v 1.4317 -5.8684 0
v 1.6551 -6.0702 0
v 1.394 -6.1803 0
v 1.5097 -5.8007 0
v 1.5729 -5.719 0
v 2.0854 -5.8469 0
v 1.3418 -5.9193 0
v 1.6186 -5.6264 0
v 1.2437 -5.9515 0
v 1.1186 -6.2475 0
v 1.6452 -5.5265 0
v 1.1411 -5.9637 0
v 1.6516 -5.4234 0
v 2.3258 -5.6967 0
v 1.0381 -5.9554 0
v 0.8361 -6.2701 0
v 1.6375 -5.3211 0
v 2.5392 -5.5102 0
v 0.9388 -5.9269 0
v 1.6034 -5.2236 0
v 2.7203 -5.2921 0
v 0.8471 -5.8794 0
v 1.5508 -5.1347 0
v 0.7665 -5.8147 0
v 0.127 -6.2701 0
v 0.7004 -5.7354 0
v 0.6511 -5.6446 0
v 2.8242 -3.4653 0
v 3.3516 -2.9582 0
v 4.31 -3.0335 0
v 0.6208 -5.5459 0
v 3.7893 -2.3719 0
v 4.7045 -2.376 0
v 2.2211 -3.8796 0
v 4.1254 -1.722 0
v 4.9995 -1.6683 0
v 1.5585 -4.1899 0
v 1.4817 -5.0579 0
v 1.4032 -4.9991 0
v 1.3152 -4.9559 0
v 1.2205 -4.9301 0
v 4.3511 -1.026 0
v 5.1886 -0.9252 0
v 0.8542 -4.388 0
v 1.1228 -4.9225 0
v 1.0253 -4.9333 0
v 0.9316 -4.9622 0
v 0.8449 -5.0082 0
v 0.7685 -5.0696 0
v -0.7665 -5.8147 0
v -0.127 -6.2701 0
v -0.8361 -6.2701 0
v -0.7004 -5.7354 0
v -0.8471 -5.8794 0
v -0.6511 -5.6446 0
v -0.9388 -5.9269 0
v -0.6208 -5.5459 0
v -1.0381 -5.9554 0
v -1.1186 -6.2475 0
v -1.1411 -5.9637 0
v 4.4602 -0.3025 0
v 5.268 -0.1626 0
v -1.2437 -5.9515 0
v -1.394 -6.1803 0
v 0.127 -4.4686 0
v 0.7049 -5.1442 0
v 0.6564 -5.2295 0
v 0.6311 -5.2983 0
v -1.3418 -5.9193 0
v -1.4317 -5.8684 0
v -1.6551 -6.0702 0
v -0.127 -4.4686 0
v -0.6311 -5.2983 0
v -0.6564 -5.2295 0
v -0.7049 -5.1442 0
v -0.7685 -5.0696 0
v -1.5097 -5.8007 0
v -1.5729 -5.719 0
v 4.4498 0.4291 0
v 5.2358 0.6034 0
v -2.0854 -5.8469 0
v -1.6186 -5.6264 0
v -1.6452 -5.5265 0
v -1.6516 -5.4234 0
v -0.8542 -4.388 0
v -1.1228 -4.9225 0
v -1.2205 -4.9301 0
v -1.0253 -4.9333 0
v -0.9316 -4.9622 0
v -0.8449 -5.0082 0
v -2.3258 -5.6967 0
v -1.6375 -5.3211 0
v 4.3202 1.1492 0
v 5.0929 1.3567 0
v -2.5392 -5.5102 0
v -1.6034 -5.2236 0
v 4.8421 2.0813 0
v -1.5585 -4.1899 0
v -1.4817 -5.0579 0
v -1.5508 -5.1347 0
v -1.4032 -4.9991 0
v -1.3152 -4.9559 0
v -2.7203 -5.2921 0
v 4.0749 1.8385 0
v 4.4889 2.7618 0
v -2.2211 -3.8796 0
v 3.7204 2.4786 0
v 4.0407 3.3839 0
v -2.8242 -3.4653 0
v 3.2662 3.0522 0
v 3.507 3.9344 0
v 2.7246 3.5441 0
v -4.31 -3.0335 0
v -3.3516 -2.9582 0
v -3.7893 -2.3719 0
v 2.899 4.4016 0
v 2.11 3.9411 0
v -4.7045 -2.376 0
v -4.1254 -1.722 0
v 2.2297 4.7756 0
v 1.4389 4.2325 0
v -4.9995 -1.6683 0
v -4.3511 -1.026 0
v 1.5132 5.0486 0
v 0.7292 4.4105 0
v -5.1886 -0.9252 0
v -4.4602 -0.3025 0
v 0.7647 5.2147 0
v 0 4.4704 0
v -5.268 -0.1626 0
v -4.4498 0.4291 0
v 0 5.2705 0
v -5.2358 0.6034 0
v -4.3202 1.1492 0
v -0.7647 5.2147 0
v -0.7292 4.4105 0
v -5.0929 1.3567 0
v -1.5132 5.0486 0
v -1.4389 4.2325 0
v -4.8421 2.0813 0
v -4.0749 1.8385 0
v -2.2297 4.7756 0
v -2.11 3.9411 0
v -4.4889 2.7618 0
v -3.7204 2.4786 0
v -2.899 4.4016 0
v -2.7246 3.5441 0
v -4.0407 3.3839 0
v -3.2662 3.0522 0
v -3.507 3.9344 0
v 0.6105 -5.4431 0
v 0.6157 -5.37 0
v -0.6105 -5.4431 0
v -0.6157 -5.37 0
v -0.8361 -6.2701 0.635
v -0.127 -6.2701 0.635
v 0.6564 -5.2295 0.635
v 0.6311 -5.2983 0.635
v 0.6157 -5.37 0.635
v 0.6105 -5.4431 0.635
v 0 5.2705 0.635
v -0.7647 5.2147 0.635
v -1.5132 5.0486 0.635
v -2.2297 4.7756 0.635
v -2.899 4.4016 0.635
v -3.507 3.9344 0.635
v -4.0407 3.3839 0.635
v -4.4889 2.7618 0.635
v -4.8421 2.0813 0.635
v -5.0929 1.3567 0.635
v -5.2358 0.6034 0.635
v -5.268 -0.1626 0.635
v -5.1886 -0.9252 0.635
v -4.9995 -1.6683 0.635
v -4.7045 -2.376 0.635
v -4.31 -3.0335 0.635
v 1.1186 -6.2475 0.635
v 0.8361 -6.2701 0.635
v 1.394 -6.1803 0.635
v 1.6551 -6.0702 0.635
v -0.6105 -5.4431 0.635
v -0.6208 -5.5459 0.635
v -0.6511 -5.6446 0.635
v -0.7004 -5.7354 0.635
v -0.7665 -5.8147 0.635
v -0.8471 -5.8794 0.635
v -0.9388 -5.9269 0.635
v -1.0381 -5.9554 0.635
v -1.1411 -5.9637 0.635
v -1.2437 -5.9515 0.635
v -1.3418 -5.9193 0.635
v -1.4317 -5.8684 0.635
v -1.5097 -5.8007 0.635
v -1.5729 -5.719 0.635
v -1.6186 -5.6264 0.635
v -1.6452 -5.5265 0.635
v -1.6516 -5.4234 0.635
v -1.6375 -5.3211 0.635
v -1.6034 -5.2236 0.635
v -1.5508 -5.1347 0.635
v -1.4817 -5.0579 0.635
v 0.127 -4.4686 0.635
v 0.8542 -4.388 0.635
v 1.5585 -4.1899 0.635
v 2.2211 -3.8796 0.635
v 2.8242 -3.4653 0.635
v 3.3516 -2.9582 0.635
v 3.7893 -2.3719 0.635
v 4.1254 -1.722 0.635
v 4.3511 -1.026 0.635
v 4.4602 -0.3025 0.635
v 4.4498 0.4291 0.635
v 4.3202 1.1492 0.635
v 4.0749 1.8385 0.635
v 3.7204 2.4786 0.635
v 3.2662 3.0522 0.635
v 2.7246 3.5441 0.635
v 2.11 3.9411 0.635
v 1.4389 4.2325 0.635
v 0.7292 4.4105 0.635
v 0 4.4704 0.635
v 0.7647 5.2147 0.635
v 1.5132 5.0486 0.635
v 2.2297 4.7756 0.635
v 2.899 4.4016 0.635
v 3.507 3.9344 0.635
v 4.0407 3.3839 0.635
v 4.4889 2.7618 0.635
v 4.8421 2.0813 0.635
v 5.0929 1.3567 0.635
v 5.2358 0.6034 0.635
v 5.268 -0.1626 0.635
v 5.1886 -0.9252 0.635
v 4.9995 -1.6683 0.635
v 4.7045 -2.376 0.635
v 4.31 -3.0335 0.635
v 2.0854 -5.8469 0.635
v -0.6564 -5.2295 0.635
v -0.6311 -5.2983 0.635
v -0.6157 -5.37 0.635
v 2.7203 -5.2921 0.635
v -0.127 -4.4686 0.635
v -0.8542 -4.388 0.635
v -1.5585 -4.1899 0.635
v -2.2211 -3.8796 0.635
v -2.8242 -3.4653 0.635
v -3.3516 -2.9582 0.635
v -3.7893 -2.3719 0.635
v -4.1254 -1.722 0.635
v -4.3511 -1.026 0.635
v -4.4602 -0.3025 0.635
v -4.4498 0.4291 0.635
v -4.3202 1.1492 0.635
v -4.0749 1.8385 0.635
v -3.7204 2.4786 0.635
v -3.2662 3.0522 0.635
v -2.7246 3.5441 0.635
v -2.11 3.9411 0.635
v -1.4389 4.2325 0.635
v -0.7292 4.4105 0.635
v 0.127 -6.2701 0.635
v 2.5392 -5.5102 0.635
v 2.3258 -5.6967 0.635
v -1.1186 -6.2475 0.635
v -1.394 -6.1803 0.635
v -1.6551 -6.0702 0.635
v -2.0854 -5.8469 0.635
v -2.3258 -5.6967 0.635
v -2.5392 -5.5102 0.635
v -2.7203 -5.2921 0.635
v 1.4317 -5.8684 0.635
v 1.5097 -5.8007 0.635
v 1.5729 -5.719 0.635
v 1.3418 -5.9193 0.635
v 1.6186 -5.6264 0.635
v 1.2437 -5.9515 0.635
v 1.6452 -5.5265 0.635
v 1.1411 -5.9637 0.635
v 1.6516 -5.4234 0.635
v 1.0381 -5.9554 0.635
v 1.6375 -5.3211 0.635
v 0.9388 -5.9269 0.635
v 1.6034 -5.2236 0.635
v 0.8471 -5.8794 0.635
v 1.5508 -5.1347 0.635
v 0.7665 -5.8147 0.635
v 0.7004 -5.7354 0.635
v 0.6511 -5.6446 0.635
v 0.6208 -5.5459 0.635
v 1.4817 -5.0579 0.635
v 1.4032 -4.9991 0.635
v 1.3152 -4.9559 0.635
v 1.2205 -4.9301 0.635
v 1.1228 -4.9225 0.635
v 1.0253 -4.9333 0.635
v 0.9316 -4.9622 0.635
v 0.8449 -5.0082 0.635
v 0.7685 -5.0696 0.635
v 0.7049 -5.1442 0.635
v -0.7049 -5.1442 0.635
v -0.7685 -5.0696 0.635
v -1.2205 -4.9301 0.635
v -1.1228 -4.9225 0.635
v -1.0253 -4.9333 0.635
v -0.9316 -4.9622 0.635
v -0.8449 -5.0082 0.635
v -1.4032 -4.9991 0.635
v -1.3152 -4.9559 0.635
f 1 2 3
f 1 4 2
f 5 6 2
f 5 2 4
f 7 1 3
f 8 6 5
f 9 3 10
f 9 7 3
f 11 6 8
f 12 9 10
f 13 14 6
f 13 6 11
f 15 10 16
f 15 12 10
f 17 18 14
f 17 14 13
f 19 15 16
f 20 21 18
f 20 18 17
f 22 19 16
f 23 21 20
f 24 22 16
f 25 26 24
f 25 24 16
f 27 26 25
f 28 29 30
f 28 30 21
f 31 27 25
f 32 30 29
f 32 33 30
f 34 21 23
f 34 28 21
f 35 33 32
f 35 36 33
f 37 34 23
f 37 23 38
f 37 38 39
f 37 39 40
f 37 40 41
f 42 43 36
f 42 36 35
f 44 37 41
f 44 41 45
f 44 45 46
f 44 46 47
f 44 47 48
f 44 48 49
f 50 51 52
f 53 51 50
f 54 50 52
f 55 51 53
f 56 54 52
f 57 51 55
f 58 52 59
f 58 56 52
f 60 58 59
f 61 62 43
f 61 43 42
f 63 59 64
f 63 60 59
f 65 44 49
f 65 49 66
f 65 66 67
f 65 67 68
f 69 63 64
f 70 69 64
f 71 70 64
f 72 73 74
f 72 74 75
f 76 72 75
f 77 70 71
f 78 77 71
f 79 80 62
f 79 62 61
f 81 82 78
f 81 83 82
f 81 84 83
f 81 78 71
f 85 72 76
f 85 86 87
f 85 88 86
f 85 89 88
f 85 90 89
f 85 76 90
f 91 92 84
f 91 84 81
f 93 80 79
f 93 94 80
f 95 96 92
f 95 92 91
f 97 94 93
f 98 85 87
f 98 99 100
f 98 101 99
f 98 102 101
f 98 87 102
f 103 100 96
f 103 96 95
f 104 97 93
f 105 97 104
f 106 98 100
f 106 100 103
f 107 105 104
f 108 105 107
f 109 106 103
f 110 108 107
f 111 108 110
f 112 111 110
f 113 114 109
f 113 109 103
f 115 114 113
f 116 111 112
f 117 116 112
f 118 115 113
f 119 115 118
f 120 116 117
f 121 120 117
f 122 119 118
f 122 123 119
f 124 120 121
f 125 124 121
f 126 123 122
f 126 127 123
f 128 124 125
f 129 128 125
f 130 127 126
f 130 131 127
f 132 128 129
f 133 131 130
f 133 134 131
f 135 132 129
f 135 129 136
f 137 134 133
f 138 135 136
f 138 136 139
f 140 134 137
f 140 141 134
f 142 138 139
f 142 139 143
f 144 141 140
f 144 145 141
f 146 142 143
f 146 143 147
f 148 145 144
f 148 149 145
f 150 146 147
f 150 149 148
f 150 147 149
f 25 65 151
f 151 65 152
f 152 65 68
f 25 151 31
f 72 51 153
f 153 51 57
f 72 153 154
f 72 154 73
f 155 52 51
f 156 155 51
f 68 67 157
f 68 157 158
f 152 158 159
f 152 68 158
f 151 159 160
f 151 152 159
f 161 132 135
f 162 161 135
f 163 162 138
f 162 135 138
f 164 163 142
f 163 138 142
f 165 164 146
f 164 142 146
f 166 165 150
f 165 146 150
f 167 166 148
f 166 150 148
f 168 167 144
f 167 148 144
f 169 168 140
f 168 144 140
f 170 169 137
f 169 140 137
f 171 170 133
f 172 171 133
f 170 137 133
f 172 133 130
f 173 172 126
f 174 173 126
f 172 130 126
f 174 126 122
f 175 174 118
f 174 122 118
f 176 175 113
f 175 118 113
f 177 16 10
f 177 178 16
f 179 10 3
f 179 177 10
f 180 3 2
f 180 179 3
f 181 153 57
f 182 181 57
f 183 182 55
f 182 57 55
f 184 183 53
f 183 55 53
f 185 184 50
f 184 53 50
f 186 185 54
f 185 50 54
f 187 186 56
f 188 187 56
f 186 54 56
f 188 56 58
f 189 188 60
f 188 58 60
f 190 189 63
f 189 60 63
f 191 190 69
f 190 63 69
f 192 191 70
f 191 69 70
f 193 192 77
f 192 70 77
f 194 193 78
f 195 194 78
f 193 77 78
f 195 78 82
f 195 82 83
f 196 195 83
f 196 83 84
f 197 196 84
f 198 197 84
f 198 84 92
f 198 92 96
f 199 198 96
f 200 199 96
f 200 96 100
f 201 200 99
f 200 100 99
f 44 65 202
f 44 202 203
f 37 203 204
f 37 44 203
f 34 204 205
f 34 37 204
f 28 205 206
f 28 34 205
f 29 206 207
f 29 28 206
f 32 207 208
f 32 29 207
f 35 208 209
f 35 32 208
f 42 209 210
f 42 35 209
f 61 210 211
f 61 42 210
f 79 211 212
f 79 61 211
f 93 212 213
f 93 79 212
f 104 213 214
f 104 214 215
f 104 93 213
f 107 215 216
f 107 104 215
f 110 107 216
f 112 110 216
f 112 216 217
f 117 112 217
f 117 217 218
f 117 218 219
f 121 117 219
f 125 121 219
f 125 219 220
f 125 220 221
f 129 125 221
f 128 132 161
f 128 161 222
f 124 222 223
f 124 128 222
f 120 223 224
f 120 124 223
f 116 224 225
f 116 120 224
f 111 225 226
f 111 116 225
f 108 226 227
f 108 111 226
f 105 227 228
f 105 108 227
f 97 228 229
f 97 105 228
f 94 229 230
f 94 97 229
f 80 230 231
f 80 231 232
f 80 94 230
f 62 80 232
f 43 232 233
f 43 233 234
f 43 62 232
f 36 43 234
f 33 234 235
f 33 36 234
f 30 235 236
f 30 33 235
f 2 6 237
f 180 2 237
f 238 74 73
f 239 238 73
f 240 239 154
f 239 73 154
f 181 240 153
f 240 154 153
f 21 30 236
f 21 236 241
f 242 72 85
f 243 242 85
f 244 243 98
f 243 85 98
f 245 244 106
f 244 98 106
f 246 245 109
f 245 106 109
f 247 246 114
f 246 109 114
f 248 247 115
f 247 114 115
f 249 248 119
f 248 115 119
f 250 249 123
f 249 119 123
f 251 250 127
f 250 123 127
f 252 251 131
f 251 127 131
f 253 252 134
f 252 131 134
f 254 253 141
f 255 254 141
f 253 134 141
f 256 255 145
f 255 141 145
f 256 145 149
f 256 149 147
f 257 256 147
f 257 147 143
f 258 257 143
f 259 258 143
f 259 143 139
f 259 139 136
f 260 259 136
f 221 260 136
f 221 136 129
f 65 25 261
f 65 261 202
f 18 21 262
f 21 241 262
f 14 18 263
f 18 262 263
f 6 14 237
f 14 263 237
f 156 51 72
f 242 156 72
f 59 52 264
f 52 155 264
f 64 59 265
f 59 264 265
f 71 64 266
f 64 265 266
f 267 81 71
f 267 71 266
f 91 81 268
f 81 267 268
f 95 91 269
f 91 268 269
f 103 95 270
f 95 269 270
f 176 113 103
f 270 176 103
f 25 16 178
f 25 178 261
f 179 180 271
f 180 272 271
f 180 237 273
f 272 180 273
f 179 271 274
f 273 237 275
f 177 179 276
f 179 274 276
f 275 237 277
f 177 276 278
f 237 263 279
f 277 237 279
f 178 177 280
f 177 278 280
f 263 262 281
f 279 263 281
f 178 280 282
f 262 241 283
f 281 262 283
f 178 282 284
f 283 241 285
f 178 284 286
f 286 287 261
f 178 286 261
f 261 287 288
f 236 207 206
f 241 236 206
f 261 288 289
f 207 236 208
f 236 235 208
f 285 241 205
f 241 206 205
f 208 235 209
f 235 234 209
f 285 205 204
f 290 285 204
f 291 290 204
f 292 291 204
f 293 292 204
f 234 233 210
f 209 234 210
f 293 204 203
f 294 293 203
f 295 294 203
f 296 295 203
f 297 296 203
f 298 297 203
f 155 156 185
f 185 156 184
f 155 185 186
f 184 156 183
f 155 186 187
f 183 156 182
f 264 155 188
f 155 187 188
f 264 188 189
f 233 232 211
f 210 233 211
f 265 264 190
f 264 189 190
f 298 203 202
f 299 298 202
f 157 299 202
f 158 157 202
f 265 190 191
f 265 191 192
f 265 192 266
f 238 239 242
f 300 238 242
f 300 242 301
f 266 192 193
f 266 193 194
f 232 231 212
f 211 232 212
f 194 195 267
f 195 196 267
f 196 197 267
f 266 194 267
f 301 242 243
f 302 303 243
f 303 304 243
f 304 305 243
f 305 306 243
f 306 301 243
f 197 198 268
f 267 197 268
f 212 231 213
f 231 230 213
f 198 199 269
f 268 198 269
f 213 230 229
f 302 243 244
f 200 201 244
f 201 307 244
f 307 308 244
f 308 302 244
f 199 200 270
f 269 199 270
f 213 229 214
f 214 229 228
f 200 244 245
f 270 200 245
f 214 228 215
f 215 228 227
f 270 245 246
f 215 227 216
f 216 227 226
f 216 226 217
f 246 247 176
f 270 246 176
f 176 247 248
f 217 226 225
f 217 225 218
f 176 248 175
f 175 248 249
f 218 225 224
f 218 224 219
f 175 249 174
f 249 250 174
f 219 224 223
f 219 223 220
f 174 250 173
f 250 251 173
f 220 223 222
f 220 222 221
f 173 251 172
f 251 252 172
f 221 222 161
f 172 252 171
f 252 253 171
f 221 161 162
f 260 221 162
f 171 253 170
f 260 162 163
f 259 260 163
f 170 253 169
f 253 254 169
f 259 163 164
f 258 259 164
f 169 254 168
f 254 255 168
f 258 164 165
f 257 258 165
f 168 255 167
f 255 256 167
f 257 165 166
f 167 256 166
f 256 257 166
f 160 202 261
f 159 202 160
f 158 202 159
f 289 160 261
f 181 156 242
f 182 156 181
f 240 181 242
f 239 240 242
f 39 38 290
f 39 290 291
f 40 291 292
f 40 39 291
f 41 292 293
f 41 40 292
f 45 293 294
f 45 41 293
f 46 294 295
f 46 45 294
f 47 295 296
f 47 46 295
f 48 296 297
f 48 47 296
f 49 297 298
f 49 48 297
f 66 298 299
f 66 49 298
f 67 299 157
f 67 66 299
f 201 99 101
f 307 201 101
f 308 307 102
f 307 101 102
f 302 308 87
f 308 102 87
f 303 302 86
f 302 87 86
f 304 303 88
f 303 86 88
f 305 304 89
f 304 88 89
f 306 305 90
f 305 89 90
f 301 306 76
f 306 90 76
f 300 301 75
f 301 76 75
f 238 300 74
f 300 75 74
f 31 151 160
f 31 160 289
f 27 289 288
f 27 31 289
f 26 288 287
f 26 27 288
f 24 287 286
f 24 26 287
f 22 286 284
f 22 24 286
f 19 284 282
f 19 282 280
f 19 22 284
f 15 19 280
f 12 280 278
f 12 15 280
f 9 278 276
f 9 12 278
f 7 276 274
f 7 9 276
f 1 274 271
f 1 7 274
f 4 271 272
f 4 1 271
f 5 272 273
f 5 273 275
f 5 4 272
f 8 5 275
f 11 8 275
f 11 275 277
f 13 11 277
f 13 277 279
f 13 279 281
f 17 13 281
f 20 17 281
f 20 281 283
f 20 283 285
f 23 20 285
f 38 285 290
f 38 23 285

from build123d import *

# Parameters (mm, degrees)
F1_DEPTH = 0.635
F3_SIZE  = 0.762
F4_R     = 1.778


with BuildPart() as f1:
    # F0 (on Top) → F1 (new body)
    with BuildSketch(Plane.XY):
        with BuildLine():
            ThreePointArc((-0.127, -4.4685956586), (-4.4699488919, 0.0635064084), (0, 4.4704))
            Line((0, 4.4704), (0, 5.2705))
            ThreePointArc((0, 5.2705), (-4.6779281786, 2.4279946882), (-4.3100217321, -3.0334605518))
            ThreePointArc((-4.3100217321, -3.0334605518), (-3.0676623044, -4.285745937), (-1.4816672103, -5.057947462))
            ThreePointArc((-1.4816672103, -5.057947462), (-1.0252949469, -4.933284971), (-0.6563876884, -5.2294670333))
            ThreePointArc((-0.6563876884, -5.2294670333), (-0.3921915118, -5.2558877526), (-0.127, -5.2689696573))
            Line((-0.127, -5.2689696573), (-0.127, -4.9438178115))
            Line((-0.127, -4.9438178115), (-0.127, -4.4685956586))
        make_face()
        with BuildLine():
            ThreePointArc((-1.4816672103, -5.057947462), (-3.0676623044, -4.285745937), (-4.3100217321, -3.0334605518))
            Line((-4.3100217321, -3.0334605518), (-2.032, -6.2701346419))
            Line((-2.032, -6.2701346419), (-0.127, -6.2701346419))
            Line((-0.127, -6.2701346419), (-0.127, -5.2689696573))
            ThreePointArc((-0.127, -5.2689696573), (-0.3921915118, -5.2558877526), (-0.6563876884, -5.2294670333))
            ThreePointArc((-0.6563876884, -5.2294670333), (-0.6221376368, -5.333847732), (-0.6105490096, -5.4430910386))
            ThreePointArc((-0.6105490096, -5.4430910386), (-1.3418027236, -5.9193216797), (-1.4816672103, -5.057947462))
        make_face()
    extrude(amount=F1_DEPTH)

    # F2: F1 across plane


with BuildPart() as f1_1:
    add(f1.part)
    add(f1.part.mirror(Plane.YZ))

    # F3
    f3_edges = [f1_1.edges().sort_by_distance(p)[0] for p in [
        (-2.032, -6.270135, 0.3175),
        (2.032, -6.270135, 0.3175),
    ]]
    chamfer(f3_edges, length=F3_SIZE)

    # F4
    f4_edges = [f1_1.edges().sort_by_distance(p)[0] for p in [
        (-1.27, -6.270135, 0.3175),
        (-2.470573, -5.646999, 0.3175),
        (1.27, -6.270135, 0.3175),
        (2.470573, -5.646999, 0.3175),
    ]]
    fillet(f4_edges, radius=F4_R)


solid = f1_1.part
